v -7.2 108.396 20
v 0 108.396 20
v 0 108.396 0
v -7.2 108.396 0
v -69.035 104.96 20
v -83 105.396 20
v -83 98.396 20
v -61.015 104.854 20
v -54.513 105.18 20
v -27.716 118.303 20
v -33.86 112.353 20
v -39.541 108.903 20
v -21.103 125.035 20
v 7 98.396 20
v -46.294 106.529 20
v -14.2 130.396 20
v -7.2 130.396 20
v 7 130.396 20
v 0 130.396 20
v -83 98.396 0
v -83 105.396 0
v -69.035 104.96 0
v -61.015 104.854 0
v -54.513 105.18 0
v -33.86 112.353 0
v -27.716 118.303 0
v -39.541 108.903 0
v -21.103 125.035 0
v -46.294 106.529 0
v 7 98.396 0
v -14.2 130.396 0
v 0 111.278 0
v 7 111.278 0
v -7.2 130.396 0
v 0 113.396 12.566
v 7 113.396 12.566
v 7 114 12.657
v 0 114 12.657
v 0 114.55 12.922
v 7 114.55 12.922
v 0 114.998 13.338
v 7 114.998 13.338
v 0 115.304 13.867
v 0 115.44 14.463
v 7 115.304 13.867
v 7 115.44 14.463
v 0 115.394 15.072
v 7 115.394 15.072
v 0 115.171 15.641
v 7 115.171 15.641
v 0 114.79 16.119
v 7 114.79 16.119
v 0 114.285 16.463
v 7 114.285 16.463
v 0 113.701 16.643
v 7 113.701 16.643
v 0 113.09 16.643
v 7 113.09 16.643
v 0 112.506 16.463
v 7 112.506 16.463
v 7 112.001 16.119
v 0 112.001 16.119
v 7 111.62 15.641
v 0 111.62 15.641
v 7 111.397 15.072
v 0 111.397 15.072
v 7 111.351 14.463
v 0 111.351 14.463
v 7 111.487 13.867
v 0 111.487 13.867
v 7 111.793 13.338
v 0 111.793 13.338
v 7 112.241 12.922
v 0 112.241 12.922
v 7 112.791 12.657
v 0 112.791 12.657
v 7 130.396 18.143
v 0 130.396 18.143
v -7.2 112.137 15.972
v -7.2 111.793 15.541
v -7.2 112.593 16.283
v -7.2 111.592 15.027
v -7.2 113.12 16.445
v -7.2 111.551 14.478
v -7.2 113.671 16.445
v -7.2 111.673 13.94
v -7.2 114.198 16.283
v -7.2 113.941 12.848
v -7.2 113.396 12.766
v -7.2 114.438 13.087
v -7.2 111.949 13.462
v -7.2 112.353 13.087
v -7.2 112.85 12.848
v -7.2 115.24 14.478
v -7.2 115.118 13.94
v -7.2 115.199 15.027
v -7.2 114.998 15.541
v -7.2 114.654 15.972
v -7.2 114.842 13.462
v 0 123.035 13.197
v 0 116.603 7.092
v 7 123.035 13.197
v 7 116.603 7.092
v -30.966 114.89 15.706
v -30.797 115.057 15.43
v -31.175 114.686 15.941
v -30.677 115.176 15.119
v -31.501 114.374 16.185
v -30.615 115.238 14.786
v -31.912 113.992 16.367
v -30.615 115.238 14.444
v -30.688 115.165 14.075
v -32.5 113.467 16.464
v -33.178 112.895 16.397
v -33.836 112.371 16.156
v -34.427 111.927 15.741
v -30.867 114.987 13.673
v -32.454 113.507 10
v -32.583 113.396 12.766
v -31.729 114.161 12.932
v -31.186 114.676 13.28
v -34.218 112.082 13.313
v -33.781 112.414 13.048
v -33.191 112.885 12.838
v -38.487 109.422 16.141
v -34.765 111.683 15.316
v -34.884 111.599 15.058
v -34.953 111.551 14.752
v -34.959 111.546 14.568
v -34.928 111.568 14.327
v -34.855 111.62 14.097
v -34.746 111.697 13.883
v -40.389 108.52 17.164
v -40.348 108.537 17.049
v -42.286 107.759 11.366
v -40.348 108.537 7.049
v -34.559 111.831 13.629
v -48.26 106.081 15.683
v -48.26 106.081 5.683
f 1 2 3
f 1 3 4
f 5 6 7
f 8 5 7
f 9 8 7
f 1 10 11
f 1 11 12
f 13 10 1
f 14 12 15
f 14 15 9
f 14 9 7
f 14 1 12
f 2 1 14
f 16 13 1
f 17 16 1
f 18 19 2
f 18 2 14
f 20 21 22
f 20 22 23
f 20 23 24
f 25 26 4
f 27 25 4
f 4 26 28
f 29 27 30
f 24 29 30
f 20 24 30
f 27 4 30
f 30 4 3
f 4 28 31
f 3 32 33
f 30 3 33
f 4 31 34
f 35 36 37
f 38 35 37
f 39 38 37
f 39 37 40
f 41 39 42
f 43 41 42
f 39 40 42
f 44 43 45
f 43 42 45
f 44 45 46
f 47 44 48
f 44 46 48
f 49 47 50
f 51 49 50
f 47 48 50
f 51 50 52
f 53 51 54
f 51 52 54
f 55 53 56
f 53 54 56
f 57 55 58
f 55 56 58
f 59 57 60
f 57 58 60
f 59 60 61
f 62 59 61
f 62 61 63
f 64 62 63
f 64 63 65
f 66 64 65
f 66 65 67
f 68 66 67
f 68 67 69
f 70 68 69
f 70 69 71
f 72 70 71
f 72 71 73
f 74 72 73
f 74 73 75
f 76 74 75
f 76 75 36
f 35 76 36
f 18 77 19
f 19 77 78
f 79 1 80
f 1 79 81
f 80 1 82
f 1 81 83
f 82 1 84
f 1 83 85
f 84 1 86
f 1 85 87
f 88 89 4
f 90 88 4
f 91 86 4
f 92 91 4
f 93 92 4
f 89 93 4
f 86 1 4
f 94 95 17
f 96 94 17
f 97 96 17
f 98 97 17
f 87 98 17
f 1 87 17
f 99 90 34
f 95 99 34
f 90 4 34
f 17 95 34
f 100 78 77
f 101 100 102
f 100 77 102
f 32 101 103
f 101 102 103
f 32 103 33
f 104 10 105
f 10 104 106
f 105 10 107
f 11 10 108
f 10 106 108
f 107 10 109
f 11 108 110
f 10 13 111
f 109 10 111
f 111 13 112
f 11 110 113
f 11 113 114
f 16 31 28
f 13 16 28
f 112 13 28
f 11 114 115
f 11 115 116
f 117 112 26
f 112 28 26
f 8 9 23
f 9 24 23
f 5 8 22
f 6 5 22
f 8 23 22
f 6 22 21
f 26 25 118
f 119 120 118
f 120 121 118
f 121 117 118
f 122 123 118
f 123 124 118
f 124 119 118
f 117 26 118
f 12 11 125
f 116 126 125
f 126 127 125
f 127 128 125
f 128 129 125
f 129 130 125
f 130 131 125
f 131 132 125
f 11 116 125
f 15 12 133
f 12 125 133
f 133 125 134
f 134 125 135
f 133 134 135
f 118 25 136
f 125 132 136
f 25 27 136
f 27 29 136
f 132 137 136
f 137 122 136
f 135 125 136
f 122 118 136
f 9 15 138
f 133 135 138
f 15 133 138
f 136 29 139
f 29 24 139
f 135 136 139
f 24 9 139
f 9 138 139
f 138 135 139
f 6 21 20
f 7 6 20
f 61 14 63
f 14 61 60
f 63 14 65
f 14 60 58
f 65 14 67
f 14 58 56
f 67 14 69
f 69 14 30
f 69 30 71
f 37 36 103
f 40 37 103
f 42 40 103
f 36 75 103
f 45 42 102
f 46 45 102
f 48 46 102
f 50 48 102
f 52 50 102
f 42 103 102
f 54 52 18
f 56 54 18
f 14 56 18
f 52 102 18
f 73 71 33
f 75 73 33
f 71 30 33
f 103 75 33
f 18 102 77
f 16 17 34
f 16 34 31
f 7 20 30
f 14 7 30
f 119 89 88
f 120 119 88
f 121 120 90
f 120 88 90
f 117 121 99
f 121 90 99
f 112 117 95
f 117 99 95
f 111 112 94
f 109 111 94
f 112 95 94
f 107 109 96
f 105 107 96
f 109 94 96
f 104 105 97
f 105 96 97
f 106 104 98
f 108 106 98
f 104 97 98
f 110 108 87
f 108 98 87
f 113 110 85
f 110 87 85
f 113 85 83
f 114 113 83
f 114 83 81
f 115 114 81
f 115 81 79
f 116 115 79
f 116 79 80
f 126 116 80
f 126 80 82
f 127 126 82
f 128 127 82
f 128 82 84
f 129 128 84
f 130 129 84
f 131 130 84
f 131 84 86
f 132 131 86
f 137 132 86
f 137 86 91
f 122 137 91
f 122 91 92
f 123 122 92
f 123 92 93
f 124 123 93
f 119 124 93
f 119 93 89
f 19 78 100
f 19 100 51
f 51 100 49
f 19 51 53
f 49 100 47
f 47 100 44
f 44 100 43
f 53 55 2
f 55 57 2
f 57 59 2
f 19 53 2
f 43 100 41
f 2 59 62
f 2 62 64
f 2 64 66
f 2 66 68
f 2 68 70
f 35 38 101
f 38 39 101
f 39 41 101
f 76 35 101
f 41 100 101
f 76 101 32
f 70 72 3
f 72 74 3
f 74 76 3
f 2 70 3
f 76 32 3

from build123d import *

# Parameters (mm, degrees)
BOSS_EXTRUDE1_DEPTH = 20
SKETCH2_R           = 53
SKETCH2_R_2         = 2.05
CUT_EXTRUDE1_DEPTH  = 14.2
SKETCH4_R           = 1.85
CUT_EXTRUDE2_DEPTH  = 56


with BuildPart() as part:
    # Sketch1 → Boss-Extrude1 (new body)
    with BuildSketch(Plane.XY):
        with BuildLine():
            Line((0, 130.395512055), (0, 108.395512055))
            Line((0, 108.395512055), (-7.2, 108.395512055))
            Line((-7.2, 108.395512055), (-7.2, 130.395512055))
            Line((-7.2, 130.395512055), (-14.2, 130.395512055))
            add(Edge.make_bspline(
                [(-14.2, 130.395512055), (-23.530576474, 124.205565192), (-38.446210931, 100.318296321), (-66.691471381, 105.395512055), (-83, 105.395512055)],
                knots=[0, 0, 0, 0, 0.267223526, 1, 1, 1, 1], degree=3))
            Line((-83, 105.395512055), (-83, 98.395512055))
            Line((-83, 98.395512055), (7, 98.395512055))
            Line((7, 98.395512055), (7, 130.395512055))
            Line((7, 130.395512055), (0, 130.395512055))
        make_face()
    extrude(amount=BOSS_EXTRUDE1_DEPTH)

    # Sketch2 → Cut-Extrude1 (cut)
    with BuildSketch(Plane(origin=(7, 0, 0), x_dir=(0, 0, -1), z_dir=(1, 0, 0))):
        with Locations((28.164207495, 156.175472317)):
            Circle(SKETCH2_R)
        with Locations((-14.615752767, 113.395512055)):
            Circle(SKETCH2_R_2)
    extrude(amount=-CUT_EXTRUDE1_DEPTH, mode=Mode.SUBTRACT)

    # Sketch4 → Cut-Extrude2 (cut)
    with BuildSketch(Plane(origin=(7, 0, 0), x_dir=(0, 0, -1), z_dir=(1, 0, 0))):
        with Locations((-14.615752767, 113.395512055)):
            Circle(SKETCH4_R)
    extrude(amount=-CUT_EXTRUDE2_DEPTH, mode=Mode.SUBTRACT)


solid = part.part
